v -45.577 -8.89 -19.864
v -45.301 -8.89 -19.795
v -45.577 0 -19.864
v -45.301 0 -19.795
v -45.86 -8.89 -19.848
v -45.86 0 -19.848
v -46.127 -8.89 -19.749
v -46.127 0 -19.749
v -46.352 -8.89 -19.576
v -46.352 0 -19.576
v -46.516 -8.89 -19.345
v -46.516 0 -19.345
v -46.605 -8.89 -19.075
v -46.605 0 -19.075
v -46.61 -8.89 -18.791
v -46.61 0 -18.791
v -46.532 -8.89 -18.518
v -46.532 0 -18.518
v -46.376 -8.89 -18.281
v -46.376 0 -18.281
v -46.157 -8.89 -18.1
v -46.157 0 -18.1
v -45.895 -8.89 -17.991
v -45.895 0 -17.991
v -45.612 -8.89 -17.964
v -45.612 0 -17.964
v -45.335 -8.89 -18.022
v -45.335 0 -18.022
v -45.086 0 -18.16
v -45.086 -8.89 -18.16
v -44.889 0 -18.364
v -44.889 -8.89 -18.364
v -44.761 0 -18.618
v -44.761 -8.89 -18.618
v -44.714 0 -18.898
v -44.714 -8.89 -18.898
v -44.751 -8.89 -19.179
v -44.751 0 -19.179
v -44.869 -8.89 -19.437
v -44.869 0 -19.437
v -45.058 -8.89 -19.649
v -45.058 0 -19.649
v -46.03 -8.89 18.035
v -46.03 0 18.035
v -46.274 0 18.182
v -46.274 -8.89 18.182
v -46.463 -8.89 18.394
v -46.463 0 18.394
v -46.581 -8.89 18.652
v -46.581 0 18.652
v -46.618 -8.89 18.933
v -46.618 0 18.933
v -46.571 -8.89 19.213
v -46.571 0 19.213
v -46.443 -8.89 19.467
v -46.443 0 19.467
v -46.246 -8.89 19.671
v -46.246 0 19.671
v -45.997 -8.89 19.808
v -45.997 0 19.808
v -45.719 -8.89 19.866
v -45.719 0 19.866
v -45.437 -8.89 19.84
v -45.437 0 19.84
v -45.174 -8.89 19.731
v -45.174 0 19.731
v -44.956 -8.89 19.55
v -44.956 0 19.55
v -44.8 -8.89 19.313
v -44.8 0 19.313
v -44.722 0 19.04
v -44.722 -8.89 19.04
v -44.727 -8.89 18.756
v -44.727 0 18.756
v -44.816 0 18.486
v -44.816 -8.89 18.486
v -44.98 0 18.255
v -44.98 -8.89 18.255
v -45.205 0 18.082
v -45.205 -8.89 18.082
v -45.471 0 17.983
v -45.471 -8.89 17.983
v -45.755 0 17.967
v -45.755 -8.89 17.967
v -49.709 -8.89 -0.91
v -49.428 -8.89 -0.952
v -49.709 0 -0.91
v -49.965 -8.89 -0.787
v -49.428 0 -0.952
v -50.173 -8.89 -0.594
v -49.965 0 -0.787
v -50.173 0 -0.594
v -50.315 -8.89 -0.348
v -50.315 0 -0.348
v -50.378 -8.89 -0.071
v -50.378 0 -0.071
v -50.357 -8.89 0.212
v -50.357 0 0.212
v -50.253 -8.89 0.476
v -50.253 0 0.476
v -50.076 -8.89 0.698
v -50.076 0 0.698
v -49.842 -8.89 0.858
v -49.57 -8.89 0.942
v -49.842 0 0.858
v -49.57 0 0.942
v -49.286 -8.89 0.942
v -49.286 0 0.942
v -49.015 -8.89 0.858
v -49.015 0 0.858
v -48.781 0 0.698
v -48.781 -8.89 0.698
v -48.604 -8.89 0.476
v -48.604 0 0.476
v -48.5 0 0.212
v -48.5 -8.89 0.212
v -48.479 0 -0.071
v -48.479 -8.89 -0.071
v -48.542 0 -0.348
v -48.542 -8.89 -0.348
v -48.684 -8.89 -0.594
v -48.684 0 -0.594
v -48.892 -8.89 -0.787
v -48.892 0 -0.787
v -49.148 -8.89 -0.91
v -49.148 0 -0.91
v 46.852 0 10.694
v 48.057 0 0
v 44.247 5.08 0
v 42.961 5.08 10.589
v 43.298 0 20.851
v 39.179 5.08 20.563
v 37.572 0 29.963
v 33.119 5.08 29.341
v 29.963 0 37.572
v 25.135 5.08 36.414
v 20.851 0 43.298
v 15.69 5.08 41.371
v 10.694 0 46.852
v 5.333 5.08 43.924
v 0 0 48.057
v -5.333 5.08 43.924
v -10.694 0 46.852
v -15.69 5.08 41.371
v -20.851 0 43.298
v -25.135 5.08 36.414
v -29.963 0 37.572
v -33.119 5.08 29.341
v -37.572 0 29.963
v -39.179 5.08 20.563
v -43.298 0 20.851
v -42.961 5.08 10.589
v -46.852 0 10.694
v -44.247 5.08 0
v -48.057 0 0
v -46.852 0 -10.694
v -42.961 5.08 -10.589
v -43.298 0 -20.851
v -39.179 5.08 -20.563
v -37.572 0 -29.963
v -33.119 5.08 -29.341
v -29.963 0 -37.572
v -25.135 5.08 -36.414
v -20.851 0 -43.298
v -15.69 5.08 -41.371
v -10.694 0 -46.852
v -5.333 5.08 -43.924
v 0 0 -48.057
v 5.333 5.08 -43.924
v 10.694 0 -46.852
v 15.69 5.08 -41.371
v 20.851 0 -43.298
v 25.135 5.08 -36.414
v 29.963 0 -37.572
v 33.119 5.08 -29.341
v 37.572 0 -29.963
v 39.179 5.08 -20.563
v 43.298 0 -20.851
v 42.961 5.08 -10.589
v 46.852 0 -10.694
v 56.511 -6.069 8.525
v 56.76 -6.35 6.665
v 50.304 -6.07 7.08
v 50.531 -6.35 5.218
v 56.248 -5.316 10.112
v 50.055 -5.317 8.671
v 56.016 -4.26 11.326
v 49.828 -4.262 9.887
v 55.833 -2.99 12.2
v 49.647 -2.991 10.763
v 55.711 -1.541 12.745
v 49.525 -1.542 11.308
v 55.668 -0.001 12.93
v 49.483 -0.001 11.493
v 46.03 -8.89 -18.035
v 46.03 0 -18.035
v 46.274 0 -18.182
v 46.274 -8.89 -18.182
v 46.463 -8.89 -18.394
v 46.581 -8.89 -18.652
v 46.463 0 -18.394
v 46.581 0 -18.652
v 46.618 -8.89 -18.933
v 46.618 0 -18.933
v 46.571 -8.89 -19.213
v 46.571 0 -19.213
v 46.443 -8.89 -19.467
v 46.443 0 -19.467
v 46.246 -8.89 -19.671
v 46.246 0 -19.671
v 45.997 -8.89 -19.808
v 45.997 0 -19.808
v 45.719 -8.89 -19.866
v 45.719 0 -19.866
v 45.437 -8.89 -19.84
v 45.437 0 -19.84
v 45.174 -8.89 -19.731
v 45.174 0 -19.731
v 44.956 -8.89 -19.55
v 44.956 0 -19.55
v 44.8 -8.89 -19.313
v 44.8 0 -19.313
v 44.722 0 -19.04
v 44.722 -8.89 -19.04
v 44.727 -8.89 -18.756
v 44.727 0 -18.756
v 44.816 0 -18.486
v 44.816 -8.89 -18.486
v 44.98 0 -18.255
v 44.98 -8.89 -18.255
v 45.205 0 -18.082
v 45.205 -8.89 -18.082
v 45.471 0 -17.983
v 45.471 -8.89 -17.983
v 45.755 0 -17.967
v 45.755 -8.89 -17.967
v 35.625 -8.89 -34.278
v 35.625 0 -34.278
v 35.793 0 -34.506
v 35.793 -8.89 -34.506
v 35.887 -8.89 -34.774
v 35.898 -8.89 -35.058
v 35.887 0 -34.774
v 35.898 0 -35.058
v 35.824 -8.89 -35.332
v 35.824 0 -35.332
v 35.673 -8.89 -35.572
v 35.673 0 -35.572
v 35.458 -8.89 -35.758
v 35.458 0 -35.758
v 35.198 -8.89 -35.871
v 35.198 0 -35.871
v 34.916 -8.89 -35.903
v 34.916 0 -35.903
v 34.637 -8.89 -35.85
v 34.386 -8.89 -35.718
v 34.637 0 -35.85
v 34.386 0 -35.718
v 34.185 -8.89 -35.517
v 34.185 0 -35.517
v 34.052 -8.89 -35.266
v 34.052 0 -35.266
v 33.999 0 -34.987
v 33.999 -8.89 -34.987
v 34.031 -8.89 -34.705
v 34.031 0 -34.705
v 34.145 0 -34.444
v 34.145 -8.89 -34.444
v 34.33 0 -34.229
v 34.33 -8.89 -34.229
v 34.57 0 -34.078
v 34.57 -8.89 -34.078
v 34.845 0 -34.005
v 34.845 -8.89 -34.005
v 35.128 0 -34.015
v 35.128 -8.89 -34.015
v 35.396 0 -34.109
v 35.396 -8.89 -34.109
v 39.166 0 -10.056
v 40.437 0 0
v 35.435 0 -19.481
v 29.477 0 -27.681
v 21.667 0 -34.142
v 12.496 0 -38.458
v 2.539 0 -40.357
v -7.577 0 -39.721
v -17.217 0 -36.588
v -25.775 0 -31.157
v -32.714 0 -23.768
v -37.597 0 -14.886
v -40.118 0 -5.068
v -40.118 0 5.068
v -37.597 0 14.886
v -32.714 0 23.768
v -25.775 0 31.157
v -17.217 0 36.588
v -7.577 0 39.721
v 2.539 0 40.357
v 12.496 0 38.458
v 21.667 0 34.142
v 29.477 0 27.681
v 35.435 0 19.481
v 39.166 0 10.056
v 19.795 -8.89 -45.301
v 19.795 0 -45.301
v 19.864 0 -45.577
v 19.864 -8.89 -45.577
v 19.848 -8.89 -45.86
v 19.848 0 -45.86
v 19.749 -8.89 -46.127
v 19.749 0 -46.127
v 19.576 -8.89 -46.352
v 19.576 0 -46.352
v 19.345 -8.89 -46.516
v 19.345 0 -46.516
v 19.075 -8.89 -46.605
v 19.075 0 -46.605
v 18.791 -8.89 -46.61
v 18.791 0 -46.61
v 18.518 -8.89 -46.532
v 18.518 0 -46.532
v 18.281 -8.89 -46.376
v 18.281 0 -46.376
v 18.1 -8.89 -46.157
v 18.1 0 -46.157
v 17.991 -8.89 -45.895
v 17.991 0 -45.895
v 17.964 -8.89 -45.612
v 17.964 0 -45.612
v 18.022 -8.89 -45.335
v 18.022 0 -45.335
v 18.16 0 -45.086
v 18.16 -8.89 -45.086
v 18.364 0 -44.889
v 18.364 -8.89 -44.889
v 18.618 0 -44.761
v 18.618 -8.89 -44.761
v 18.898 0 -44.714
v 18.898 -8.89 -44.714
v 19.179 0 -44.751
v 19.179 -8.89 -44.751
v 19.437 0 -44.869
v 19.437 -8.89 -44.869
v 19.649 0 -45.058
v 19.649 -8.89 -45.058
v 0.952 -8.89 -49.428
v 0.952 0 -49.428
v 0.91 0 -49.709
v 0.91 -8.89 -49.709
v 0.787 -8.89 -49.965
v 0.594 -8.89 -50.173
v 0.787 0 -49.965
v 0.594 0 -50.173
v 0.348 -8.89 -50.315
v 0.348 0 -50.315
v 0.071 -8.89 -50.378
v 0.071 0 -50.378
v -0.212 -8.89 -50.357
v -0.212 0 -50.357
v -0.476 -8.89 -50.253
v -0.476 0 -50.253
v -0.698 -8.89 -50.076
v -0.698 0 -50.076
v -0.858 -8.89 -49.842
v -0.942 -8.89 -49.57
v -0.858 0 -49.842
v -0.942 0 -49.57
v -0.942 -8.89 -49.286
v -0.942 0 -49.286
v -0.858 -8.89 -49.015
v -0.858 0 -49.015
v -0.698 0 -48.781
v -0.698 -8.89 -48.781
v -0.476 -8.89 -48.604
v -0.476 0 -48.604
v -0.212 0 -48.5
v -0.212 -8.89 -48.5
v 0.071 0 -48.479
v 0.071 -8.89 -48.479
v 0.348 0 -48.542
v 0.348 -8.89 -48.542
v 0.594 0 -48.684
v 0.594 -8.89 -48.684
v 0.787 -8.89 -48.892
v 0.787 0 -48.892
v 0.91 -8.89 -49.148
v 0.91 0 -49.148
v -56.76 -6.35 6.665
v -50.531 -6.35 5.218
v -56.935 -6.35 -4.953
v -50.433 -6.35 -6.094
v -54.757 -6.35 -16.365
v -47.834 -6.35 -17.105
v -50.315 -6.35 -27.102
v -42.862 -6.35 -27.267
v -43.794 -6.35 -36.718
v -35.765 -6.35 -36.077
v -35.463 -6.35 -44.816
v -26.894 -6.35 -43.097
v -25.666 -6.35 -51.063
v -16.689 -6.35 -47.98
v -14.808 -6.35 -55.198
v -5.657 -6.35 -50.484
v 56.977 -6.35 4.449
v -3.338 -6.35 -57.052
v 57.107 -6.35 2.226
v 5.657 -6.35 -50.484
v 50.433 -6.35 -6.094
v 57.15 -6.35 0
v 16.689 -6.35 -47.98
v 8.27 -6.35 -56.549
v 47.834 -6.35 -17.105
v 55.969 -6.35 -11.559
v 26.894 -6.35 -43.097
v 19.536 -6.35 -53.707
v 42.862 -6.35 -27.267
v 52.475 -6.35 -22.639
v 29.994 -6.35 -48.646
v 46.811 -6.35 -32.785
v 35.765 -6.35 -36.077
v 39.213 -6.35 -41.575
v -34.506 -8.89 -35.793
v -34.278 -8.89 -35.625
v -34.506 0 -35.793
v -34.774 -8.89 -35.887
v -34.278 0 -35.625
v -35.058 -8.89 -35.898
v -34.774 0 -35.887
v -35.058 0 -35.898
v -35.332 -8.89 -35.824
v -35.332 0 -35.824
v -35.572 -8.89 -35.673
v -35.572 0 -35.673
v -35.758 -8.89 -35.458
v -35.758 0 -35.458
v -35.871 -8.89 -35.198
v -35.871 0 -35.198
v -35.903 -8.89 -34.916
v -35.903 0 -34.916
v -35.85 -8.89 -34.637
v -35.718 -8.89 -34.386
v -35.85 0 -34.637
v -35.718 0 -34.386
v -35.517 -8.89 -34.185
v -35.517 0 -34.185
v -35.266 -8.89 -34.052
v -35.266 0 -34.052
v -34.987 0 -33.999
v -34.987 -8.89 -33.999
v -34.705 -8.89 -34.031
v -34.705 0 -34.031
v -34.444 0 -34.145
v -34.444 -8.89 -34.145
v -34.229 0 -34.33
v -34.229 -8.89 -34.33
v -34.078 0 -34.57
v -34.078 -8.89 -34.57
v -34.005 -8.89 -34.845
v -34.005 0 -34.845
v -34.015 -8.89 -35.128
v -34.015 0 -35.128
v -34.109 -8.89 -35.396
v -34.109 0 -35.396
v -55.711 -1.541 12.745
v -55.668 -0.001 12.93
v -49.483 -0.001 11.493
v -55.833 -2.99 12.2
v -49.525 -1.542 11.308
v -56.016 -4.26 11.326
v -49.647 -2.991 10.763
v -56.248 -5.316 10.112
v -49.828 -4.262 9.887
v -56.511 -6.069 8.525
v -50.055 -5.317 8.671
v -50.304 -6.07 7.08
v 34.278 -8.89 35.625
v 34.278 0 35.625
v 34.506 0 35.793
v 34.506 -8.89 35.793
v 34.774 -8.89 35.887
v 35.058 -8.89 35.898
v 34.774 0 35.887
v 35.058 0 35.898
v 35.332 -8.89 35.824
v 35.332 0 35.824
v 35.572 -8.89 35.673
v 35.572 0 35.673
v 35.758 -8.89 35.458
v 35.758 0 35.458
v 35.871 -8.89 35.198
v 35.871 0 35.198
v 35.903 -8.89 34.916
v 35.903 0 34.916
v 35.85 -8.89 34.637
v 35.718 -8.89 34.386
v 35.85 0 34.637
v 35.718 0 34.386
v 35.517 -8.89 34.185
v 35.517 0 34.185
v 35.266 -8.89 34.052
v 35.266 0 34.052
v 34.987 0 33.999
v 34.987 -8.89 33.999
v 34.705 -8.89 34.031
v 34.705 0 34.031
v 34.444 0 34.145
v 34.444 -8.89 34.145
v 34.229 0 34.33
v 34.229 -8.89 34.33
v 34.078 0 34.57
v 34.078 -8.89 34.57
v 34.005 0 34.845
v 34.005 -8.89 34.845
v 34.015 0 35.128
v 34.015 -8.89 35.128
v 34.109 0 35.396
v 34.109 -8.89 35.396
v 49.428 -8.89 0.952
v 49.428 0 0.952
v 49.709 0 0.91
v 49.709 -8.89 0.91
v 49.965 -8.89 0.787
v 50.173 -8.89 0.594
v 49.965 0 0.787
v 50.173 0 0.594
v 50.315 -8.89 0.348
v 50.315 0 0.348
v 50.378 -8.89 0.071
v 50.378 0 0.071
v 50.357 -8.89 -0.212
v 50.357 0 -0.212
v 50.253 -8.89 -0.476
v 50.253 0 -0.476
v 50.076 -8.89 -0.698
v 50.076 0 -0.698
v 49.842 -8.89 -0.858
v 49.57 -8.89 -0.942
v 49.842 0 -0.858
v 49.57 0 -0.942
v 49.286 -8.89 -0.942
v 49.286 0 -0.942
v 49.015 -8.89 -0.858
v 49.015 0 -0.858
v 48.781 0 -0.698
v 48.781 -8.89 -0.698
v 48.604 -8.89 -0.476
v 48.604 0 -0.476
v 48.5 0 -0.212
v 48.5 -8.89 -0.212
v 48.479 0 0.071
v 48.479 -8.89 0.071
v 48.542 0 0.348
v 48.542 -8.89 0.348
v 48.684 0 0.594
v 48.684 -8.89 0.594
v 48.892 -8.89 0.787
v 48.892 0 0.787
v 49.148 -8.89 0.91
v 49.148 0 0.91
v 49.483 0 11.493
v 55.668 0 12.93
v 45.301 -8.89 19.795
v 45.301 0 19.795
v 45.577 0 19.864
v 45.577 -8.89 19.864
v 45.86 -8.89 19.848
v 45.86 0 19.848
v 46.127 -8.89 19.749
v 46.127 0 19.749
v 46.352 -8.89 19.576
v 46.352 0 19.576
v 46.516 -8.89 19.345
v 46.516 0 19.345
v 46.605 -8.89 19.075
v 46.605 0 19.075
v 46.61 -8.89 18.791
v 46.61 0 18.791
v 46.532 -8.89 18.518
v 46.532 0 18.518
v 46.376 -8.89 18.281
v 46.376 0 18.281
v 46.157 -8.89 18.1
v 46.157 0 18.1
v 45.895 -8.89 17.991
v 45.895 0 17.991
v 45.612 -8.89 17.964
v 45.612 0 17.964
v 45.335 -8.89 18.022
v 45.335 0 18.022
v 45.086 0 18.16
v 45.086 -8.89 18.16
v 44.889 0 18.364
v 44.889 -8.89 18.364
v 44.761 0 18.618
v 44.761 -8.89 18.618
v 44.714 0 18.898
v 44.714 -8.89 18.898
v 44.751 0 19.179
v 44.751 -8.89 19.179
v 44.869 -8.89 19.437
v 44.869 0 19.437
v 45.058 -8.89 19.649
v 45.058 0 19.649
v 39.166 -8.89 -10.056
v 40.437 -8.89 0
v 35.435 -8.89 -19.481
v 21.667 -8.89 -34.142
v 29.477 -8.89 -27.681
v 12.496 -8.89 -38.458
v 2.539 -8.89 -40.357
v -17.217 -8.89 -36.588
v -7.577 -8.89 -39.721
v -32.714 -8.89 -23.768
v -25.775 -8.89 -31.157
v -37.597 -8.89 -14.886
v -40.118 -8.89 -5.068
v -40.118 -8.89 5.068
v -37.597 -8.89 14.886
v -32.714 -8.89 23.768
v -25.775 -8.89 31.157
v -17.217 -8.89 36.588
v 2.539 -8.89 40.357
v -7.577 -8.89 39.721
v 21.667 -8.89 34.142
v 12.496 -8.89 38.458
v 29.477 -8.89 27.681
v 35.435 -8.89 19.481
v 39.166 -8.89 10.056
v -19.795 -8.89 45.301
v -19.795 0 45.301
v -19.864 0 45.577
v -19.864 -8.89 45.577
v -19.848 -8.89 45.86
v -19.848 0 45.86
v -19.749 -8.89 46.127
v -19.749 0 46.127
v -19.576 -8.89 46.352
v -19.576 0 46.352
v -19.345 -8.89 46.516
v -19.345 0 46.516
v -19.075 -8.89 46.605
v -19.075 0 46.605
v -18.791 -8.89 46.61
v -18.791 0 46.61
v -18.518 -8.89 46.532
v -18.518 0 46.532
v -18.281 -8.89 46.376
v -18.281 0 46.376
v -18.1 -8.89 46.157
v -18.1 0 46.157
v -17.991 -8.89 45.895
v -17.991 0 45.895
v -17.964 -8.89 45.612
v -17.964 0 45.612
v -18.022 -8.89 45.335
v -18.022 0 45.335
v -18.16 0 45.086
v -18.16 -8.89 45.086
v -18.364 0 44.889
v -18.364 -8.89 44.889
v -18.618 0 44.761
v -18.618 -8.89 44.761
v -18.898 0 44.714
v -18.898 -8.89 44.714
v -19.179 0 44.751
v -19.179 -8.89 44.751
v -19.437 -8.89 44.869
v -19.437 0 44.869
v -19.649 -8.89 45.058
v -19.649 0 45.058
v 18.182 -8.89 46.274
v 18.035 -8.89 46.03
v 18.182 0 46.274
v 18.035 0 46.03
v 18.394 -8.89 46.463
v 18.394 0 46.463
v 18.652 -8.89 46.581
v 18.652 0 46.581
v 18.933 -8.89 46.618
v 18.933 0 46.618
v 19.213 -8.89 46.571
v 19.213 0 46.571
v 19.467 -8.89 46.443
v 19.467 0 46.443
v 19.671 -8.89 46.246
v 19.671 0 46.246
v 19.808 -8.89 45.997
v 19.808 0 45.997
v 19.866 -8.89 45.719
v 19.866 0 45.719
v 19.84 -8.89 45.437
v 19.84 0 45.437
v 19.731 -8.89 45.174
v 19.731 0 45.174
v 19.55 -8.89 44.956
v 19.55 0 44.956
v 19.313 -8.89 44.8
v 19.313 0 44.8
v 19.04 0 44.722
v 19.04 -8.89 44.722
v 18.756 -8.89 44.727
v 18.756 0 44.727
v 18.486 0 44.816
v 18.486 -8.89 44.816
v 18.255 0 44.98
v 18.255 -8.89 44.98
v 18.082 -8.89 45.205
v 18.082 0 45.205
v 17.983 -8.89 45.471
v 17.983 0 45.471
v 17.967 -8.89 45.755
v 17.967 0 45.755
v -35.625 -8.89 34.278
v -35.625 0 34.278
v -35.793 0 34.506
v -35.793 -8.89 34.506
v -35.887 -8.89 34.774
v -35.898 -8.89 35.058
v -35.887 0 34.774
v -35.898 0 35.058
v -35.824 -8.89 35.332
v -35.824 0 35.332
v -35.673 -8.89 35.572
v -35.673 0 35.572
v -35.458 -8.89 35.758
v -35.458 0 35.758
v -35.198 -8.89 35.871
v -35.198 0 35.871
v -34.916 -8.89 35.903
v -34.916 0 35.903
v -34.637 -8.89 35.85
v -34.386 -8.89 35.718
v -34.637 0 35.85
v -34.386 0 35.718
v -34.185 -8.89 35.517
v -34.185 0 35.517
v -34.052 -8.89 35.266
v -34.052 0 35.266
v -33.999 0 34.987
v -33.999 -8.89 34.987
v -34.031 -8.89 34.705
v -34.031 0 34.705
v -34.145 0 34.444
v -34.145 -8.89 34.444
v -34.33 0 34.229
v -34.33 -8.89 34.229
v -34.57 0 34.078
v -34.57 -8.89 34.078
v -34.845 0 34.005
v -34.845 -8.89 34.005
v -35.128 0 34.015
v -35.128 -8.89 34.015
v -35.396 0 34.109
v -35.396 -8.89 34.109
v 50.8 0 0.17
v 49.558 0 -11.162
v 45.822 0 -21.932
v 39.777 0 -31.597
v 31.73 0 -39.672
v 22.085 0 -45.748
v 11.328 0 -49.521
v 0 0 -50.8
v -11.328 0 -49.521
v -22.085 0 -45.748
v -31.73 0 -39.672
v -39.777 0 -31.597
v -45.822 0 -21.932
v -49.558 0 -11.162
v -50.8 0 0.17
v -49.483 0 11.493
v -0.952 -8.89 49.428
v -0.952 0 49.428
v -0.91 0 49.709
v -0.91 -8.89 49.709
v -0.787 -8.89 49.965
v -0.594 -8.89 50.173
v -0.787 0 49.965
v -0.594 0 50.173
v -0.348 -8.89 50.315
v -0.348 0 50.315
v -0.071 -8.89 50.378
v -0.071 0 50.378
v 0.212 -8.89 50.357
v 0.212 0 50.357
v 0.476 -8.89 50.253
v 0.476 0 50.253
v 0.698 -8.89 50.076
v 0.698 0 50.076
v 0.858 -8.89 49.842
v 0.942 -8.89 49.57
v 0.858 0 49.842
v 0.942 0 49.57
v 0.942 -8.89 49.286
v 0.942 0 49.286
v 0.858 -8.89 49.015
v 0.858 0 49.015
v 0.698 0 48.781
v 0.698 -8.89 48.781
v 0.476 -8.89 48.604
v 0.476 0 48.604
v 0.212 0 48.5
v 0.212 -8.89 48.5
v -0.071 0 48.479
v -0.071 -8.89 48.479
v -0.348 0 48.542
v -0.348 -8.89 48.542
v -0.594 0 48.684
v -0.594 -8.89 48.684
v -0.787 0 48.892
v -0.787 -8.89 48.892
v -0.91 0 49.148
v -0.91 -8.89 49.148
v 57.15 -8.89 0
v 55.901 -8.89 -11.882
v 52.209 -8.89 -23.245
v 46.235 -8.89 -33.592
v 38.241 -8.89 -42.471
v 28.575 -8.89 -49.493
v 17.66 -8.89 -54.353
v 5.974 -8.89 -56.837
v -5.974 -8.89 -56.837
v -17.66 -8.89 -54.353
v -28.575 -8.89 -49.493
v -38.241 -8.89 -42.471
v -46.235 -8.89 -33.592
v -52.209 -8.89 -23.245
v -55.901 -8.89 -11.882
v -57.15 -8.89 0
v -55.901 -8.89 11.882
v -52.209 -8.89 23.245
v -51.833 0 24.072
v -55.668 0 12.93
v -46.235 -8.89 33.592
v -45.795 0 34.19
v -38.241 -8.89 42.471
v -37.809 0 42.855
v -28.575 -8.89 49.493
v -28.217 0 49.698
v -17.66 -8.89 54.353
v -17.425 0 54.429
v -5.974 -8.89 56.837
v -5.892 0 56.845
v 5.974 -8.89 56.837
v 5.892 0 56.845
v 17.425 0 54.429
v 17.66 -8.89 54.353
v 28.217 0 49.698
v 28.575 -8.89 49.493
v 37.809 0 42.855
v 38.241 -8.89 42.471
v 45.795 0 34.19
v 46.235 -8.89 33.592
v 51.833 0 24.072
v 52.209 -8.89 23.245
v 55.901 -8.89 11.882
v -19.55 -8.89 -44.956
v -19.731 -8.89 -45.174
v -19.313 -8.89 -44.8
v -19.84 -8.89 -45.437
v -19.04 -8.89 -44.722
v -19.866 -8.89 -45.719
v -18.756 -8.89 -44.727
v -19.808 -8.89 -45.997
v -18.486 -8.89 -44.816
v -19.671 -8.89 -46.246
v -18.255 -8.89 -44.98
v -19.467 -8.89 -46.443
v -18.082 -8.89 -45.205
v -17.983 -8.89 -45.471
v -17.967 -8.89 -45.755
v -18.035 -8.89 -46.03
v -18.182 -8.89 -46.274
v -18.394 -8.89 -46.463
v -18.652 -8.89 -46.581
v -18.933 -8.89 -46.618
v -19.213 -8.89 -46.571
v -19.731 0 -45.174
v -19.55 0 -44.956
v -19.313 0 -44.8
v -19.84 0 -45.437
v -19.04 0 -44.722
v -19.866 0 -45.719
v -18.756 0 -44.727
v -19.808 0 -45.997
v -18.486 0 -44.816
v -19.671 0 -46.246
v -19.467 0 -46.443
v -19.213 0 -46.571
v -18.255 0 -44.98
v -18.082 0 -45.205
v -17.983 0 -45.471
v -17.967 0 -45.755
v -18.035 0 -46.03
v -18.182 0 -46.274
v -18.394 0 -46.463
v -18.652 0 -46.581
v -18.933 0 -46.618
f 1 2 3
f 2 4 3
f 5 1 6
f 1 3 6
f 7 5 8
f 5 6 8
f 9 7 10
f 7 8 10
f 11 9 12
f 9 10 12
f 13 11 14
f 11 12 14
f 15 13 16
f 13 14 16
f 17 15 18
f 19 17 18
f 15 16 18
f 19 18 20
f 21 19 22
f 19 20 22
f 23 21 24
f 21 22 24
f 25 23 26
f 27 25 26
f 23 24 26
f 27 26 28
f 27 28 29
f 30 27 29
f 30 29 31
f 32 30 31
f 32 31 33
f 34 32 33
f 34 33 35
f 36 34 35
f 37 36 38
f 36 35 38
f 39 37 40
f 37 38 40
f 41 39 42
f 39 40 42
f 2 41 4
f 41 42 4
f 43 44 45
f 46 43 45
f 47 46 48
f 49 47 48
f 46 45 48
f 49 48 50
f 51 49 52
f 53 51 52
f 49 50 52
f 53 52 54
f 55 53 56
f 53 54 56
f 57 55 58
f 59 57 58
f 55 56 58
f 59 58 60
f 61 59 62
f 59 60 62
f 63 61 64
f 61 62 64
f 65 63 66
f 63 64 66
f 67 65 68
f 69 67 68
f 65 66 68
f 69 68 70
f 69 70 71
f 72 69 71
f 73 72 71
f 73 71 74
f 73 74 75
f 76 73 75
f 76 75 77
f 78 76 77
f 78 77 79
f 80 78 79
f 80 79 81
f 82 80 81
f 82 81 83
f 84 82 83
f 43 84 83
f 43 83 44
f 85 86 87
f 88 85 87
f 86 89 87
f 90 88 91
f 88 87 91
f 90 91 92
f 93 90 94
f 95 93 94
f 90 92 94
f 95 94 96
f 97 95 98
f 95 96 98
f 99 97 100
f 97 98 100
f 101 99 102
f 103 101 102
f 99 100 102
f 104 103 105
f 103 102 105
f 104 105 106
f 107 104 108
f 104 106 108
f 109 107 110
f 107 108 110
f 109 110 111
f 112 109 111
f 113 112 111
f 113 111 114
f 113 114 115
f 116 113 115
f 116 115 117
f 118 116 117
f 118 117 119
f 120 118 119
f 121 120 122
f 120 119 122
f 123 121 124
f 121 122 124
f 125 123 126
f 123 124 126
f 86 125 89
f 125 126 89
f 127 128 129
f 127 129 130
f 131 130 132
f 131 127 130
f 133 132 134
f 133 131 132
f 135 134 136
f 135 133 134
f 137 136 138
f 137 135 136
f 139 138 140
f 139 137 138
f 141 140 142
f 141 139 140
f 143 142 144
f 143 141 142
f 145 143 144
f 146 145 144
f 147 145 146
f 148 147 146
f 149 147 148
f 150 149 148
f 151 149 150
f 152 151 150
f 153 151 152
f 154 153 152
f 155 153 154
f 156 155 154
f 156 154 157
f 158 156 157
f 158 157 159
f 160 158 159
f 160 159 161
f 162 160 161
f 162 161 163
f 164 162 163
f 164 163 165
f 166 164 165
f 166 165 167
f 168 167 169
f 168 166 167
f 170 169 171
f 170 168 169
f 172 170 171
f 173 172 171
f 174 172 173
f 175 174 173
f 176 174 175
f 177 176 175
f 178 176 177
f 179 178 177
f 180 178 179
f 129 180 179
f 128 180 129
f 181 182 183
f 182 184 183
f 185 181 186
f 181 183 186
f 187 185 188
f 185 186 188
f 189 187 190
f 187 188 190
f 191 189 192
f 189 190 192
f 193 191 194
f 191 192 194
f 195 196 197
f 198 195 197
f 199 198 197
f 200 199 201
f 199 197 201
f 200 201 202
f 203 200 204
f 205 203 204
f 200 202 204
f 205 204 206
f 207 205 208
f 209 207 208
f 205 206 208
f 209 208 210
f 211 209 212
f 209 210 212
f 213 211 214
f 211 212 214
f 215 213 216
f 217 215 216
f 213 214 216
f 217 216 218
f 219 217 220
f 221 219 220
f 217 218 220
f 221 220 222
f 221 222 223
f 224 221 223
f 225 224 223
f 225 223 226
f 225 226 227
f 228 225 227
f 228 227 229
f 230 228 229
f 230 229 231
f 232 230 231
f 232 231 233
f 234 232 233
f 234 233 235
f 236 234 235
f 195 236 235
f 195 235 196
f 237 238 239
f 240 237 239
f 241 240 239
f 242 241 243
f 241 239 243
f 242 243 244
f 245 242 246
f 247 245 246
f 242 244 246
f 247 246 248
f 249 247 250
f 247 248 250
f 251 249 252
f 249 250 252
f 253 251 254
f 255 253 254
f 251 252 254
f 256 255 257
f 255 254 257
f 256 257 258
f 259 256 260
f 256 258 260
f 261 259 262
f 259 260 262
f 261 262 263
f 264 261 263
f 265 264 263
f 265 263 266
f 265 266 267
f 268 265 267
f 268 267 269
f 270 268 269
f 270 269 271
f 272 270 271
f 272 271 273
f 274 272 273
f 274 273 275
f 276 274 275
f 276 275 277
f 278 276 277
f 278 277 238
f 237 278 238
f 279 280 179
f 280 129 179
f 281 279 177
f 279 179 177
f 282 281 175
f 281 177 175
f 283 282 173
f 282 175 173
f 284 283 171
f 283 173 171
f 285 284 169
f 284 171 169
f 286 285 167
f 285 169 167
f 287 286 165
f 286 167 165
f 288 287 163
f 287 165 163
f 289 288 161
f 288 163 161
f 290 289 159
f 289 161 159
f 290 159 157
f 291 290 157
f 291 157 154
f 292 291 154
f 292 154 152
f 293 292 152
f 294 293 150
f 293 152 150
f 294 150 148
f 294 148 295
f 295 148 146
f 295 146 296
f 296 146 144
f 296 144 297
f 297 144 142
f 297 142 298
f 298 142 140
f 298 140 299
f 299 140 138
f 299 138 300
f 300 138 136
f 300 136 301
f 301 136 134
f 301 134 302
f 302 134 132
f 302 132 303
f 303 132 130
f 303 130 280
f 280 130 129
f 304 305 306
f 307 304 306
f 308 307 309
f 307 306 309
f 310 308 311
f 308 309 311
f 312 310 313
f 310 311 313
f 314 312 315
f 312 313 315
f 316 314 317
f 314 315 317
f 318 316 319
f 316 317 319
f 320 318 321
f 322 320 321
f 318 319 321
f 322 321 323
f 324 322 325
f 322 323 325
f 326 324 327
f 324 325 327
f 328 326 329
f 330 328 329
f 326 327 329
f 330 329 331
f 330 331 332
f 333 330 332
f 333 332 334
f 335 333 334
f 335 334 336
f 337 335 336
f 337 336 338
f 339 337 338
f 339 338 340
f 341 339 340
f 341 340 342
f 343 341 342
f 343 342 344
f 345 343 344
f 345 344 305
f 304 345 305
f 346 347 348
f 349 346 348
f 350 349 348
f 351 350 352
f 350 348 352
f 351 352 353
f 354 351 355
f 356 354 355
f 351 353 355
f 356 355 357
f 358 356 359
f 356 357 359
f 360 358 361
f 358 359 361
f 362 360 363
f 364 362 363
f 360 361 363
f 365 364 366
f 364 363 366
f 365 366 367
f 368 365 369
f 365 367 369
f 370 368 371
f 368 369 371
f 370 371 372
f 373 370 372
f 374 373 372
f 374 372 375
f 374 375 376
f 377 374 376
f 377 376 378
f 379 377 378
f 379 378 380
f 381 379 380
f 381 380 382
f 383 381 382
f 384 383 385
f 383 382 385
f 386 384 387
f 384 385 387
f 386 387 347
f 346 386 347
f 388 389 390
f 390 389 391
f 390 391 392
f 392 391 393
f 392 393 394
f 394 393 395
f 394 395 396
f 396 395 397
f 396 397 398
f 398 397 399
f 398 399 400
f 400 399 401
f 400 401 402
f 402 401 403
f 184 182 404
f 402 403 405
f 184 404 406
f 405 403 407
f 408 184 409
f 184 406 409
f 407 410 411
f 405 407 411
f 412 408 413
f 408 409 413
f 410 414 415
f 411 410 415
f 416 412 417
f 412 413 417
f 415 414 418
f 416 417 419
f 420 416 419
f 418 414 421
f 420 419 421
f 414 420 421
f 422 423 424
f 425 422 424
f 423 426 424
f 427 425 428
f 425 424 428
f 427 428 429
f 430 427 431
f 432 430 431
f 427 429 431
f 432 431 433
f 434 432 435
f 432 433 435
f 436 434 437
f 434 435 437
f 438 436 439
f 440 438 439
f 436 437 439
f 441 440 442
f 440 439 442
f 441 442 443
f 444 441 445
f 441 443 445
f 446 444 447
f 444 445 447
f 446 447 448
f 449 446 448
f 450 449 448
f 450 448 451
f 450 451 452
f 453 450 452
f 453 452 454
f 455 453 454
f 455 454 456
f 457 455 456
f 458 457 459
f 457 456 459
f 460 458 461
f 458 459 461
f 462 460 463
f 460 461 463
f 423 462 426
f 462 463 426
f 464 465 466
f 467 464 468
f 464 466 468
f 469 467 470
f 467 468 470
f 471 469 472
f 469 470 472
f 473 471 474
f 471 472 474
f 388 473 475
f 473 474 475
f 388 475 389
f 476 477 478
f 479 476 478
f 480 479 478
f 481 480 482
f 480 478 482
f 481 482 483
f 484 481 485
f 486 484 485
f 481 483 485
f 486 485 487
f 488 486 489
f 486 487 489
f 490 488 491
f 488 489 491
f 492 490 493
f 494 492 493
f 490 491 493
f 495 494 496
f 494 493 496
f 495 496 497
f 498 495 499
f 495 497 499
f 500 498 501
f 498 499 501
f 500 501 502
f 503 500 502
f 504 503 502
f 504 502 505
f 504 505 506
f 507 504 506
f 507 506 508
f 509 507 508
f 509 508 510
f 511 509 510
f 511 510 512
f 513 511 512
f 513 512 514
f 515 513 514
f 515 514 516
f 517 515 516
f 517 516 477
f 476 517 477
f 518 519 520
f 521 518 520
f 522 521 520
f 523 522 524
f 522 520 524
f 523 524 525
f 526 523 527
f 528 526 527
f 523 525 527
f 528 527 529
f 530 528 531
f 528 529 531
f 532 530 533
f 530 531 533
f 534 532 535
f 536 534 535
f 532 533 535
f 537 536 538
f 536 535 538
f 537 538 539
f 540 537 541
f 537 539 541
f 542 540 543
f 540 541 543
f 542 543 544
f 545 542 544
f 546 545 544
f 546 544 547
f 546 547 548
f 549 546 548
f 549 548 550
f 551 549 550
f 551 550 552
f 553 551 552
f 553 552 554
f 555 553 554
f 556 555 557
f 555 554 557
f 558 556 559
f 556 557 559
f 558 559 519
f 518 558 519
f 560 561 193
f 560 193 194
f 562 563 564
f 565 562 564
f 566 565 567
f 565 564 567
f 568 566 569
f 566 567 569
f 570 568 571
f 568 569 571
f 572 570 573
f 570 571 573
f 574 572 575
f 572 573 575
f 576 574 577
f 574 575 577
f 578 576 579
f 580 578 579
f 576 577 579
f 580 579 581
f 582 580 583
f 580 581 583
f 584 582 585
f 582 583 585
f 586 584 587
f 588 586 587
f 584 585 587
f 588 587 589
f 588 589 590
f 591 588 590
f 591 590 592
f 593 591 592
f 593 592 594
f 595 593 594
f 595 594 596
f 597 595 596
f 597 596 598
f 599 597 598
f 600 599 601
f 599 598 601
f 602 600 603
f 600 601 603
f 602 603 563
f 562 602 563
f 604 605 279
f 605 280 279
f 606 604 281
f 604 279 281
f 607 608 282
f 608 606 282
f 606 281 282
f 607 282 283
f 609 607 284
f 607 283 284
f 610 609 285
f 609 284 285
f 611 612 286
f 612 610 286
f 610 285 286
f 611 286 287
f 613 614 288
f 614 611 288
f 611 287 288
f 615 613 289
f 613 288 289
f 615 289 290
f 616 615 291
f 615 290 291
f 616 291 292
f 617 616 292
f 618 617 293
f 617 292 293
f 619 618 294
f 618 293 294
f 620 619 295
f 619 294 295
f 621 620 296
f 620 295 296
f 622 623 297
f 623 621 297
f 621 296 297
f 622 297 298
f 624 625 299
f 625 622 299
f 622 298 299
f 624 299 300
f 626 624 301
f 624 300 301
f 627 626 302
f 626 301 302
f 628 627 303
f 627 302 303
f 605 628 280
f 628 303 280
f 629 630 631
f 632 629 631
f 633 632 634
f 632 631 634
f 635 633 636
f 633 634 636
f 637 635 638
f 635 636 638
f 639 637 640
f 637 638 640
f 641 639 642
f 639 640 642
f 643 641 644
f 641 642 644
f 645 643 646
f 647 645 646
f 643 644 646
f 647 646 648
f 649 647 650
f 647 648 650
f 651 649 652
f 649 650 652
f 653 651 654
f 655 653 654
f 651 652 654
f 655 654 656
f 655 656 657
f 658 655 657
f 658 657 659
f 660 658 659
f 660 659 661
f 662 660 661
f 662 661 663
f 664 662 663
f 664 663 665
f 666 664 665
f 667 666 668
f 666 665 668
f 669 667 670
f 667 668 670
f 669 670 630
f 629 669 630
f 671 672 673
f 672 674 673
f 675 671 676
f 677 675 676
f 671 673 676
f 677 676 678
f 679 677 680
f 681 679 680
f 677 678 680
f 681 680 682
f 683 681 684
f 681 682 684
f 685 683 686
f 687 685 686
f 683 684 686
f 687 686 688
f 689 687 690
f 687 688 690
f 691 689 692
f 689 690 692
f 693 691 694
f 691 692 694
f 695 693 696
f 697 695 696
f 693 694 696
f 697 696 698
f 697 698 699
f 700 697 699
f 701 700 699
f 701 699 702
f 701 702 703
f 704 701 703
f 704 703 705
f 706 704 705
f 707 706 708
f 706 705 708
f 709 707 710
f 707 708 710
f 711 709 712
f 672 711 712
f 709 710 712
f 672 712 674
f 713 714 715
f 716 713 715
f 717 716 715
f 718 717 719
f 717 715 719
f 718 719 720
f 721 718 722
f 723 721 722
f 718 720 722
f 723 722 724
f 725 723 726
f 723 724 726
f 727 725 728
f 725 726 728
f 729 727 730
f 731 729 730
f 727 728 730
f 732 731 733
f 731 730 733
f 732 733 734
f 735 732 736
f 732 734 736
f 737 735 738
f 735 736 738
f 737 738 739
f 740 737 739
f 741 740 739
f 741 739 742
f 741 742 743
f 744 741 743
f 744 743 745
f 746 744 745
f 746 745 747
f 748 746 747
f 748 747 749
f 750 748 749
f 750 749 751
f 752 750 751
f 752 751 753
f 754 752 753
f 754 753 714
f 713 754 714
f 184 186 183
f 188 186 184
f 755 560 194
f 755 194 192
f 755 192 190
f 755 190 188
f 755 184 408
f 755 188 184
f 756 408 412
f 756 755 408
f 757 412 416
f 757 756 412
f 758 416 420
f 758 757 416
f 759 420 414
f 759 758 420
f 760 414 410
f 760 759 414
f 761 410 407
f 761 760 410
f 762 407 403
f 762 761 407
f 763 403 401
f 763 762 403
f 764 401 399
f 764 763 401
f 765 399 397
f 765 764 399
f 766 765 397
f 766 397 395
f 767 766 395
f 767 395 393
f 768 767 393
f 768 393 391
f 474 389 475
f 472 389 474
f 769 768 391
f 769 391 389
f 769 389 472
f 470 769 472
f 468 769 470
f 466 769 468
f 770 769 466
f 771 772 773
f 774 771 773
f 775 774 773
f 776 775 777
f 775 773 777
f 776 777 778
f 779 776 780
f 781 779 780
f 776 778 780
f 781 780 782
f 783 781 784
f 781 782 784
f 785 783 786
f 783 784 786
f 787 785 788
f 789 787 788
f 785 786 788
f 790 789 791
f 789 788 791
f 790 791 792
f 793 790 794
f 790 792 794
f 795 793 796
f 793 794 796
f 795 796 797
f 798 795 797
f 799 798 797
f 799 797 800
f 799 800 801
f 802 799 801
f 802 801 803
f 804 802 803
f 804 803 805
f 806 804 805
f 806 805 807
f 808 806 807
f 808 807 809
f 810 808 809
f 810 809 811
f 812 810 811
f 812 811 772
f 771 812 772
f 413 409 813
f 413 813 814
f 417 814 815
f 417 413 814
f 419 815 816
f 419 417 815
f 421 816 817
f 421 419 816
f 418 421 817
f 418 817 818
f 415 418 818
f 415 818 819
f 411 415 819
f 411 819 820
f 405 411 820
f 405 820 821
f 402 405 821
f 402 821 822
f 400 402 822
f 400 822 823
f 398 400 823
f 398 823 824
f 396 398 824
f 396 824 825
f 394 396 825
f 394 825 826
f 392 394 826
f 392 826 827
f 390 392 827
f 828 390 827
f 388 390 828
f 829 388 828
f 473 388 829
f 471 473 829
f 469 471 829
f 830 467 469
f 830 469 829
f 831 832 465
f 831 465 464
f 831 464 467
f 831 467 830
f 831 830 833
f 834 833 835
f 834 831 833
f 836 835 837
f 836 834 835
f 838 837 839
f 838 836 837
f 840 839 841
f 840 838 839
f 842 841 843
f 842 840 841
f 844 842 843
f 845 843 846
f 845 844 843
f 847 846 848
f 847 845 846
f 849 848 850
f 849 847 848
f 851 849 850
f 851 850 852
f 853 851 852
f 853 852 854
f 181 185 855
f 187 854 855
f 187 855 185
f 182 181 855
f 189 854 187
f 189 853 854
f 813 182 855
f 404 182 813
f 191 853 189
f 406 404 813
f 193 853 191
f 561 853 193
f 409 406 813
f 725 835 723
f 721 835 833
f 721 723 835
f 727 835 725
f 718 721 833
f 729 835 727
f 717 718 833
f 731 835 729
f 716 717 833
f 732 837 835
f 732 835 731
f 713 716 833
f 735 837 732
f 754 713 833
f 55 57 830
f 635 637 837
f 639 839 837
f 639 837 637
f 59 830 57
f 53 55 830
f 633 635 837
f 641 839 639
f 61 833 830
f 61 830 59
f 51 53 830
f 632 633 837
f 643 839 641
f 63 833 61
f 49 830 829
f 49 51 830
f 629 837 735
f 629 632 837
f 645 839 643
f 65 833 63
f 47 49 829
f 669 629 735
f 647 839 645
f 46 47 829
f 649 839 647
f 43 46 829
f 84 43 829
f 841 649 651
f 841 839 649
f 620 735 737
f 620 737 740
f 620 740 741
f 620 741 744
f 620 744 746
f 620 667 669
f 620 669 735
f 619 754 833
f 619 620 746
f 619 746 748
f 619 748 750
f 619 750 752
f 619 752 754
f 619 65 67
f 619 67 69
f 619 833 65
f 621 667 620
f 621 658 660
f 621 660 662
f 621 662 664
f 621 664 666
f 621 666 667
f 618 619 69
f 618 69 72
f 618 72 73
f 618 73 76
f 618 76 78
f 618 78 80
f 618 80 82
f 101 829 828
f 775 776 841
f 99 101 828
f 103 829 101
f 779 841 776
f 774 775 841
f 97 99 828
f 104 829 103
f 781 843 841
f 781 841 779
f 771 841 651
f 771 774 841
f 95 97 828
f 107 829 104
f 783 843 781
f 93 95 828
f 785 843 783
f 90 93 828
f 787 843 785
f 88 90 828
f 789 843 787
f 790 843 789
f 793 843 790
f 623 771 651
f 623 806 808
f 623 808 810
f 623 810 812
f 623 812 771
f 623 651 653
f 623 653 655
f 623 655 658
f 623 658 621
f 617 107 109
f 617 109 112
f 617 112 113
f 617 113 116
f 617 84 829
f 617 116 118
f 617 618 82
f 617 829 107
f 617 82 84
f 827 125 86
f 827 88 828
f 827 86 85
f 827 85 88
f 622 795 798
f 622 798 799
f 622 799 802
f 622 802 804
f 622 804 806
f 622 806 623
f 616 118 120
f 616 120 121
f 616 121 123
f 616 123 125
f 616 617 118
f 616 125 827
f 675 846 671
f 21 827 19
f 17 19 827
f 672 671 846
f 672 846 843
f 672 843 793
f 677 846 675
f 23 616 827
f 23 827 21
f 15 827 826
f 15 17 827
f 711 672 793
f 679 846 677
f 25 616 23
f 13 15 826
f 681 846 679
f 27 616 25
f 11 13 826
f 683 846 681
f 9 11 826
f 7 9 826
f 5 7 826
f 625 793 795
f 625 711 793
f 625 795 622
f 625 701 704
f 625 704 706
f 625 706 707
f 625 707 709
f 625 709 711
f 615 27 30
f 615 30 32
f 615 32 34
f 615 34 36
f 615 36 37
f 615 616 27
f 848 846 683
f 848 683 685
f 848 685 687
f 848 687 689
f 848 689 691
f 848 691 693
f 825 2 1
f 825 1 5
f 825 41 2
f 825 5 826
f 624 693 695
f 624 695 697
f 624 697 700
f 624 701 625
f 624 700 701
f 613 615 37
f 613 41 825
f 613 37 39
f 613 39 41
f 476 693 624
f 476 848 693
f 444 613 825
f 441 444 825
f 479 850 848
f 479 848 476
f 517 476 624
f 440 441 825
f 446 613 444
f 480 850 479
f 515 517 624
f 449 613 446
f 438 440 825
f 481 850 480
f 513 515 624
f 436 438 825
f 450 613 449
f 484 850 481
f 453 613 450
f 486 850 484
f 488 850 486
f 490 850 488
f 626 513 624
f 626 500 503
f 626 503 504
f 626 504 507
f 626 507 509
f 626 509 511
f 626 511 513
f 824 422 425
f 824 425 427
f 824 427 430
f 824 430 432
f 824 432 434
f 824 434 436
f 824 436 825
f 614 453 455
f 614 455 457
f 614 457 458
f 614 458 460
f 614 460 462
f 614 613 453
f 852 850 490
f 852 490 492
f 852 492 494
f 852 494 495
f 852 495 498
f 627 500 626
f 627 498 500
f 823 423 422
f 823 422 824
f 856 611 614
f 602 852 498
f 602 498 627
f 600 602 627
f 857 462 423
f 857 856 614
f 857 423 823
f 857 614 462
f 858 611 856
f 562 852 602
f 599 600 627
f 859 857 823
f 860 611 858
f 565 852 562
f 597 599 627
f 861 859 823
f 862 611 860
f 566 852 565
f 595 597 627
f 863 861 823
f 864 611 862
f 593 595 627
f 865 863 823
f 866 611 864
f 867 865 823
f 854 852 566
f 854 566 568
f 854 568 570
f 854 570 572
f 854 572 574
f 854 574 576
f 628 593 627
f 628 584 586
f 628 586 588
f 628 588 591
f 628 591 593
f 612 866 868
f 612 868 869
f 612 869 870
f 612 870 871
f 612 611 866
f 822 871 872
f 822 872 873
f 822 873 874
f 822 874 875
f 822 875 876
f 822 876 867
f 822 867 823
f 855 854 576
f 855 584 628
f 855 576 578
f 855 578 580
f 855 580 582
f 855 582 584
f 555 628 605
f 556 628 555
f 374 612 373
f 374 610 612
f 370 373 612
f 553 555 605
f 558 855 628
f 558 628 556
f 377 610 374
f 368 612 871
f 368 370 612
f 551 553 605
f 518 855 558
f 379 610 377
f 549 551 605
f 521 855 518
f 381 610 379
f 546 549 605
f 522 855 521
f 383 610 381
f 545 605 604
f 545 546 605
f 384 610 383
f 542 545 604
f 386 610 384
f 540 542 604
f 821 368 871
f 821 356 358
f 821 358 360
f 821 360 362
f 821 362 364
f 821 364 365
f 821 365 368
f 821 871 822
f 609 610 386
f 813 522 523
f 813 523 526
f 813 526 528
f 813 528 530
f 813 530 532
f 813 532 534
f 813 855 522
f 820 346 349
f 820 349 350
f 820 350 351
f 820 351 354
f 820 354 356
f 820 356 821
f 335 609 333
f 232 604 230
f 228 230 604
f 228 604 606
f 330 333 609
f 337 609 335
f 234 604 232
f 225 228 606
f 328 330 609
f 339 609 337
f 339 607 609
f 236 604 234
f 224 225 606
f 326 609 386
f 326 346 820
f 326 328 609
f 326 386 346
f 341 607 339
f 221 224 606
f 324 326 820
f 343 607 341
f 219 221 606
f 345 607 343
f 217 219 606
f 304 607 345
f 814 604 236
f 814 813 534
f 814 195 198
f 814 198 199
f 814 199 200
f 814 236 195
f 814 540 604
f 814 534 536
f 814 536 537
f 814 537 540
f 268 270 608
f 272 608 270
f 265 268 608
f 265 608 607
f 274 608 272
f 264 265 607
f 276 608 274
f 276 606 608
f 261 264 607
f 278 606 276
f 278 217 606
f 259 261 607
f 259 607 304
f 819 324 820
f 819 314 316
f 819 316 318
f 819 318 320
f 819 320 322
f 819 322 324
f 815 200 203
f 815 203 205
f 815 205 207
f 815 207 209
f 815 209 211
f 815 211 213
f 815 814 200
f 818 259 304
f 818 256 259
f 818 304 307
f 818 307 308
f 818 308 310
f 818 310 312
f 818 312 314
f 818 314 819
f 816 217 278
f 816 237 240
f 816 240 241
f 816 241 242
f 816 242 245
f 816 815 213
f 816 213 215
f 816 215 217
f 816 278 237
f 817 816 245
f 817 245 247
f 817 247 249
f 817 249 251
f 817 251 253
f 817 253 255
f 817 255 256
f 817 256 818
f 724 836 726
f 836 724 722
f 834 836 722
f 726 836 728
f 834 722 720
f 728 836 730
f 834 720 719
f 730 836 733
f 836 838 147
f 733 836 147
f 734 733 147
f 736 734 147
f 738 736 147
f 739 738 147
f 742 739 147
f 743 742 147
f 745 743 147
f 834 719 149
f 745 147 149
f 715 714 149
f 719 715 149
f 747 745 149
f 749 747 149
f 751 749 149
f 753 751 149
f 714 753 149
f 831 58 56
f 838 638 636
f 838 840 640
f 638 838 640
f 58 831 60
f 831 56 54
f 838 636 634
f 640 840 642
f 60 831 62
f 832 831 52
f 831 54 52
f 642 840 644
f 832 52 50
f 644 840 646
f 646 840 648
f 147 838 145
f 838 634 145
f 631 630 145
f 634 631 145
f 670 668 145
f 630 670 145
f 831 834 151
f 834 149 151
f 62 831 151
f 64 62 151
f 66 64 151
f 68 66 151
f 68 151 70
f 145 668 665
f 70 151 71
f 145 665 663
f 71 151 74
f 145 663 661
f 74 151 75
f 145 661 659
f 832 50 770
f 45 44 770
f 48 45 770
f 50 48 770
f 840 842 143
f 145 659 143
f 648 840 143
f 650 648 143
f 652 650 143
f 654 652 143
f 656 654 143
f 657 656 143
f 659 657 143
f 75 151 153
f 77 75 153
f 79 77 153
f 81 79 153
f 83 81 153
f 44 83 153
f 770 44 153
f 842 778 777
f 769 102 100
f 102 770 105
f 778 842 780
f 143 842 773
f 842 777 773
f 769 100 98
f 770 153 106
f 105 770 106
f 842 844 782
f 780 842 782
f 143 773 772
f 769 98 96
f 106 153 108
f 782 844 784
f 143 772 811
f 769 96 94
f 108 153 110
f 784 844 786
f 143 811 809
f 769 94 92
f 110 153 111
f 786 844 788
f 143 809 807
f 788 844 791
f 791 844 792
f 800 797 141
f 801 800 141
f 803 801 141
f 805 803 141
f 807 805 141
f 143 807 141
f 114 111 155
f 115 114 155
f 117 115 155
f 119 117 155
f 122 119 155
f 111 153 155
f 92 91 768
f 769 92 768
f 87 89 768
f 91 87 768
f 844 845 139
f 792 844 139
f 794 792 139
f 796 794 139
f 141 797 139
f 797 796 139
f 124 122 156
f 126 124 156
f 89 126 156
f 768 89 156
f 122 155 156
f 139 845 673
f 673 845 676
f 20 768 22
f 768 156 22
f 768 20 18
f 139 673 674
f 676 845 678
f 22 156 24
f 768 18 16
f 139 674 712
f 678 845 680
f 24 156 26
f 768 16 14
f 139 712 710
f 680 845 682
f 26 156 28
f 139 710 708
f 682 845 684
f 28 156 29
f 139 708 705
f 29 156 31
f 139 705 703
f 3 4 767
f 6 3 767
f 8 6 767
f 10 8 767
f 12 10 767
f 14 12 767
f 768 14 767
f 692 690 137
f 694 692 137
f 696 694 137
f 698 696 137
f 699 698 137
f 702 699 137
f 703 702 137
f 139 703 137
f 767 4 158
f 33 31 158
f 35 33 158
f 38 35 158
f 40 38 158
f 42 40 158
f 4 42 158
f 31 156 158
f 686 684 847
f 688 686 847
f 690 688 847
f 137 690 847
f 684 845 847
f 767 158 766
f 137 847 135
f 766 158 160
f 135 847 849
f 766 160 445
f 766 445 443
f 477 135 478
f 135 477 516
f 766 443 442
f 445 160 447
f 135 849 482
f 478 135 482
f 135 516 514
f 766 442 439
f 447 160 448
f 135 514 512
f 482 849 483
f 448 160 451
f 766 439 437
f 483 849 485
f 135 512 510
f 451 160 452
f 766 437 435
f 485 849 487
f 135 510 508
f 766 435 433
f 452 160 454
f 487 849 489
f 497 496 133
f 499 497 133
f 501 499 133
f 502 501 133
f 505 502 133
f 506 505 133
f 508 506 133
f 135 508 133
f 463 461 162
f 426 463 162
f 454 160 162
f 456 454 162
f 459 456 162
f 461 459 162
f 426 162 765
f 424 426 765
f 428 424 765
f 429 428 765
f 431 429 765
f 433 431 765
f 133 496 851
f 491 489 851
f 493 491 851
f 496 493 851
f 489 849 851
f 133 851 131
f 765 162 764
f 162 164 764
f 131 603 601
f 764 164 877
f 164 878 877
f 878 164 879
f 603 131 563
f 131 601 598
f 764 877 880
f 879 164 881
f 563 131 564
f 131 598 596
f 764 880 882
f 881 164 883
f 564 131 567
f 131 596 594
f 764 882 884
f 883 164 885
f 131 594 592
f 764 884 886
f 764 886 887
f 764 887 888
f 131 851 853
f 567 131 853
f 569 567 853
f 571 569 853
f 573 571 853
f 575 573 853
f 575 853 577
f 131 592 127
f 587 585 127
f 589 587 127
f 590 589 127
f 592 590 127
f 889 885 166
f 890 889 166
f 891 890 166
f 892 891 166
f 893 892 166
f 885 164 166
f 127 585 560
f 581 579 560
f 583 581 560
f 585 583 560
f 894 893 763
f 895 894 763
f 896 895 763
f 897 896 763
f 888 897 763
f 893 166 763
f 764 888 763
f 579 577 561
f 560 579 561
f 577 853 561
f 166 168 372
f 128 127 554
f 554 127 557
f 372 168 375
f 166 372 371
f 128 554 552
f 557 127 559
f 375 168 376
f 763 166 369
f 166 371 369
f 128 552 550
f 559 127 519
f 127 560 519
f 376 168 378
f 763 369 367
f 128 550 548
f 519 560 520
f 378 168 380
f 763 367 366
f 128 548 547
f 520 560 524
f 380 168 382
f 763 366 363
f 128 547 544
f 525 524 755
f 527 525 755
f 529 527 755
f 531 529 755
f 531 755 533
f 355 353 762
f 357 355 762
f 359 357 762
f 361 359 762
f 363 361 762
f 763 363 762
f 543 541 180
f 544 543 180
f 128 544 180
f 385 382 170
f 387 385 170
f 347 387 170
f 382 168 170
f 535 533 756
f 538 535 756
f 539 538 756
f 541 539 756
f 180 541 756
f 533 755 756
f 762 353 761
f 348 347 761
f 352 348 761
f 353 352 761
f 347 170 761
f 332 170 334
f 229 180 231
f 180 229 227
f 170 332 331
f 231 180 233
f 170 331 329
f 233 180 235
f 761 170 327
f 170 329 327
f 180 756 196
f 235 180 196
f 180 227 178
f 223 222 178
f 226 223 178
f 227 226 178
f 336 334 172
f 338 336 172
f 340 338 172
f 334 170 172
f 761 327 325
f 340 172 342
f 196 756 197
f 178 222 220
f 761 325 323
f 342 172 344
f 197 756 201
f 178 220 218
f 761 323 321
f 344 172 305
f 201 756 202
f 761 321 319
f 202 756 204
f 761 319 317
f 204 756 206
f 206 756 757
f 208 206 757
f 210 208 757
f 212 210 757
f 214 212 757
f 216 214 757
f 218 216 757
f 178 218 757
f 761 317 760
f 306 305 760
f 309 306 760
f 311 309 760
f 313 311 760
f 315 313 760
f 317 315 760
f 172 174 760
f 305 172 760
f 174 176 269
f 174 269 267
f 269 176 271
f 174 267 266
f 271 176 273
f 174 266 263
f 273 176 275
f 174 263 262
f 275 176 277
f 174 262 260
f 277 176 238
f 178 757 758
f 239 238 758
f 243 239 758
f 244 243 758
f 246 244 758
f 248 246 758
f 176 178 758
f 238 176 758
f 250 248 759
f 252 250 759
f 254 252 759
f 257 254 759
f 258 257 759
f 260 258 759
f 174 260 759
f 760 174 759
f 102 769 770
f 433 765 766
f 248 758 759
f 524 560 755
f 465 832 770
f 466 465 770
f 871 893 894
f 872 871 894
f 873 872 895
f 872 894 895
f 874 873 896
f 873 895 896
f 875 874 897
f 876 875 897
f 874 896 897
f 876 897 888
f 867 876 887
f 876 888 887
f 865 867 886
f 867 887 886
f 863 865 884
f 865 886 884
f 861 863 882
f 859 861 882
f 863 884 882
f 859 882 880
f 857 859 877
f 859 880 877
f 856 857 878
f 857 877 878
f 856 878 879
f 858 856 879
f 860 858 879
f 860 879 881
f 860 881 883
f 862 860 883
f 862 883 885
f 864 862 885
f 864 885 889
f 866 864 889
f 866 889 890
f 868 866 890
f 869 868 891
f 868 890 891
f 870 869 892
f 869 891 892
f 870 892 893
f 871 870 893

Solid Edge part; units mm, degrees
sketch "Sketch1" plane through (0, 0, 0) normal (0, -1, 0) x (1, 0, 0)
  circle A0 centre (0, 0) radius 40.4368
  circle A1 centre (0, 0) radius 50.8
  dimension "D1" = 101.6
  dimension "D2" = 114.3
  dimension "D3" = 80.8736
extrude "Protrusion1" add sketch "Sketch1" along normal blind 8.89
sketch "Sketch2" plane through (0, 0, 0) normal (0, 0, 1) x (1, 0, 0)
  line L0 (44.2468, 5.08) -> (40.4368, 0)
  line L1 (40.4368, 0) -> (48.0568, 0)
  line L2 (44.2468, 5.08) -> (48.0568, 0)
revolve "RevolvedProtrusion1" add sketch "Sketch2" angle 360 about axis through (0, 0, 0) along (0, 1, 0)
sketch "Sketch3" plane through (0, 0, 0) normal (0, 1, 0) x (-1, 0, 0)
  circle A0 centre (0, 49.4284) radius 0.9525
extrude "Cutout1" cut sketch "Sketch3" against normal through all
pattern_circular "Pattern_2" count 16 over 360 about axis through (0, 0, 0) along (0, 1, 0) of "Cutout1"
sketch "Sketch4" plane through (0, 0, 0) normal (0, -1, 0) x (1, 0, 0)
  circle A0 centre (0, 0) radius 57.15
  circle A1 centre (0, 0) radius 50.8
  dimension "D1" = 101.6
  dimension "D2" = 114.3
  dimension "D3" = 80.8736
extrude "Protrusion2" add sketch "Sketch4" along normal up to vertex (8.89 mm away)
sketch "Sketch5" plane through (0, 0, 0) normal (0, 1, 0) x (-1, 0, 0)
  line L0 (-55.6682, 12.9297) -> (-49.4828, 11.493)
  line L1 (55.6682, 12.9297) -> (49.4828, 11.493)
  arc A0 (49.4828, 11.493) -> (-49.4828, 11.493) centre (0, 0) cw
  arc A1 (55.6682, 12.9297) -> (-55.6682, 12.9297) centre (0, 0) cw
extrude "Cutout17" cut sketch "Sketch5" against normal blind 6.35
fillet "Round_2" radius 6.35 2 edges at (52.5755, -6.35, 12.2114) (-52.5755, -6.35, 12.2114)
